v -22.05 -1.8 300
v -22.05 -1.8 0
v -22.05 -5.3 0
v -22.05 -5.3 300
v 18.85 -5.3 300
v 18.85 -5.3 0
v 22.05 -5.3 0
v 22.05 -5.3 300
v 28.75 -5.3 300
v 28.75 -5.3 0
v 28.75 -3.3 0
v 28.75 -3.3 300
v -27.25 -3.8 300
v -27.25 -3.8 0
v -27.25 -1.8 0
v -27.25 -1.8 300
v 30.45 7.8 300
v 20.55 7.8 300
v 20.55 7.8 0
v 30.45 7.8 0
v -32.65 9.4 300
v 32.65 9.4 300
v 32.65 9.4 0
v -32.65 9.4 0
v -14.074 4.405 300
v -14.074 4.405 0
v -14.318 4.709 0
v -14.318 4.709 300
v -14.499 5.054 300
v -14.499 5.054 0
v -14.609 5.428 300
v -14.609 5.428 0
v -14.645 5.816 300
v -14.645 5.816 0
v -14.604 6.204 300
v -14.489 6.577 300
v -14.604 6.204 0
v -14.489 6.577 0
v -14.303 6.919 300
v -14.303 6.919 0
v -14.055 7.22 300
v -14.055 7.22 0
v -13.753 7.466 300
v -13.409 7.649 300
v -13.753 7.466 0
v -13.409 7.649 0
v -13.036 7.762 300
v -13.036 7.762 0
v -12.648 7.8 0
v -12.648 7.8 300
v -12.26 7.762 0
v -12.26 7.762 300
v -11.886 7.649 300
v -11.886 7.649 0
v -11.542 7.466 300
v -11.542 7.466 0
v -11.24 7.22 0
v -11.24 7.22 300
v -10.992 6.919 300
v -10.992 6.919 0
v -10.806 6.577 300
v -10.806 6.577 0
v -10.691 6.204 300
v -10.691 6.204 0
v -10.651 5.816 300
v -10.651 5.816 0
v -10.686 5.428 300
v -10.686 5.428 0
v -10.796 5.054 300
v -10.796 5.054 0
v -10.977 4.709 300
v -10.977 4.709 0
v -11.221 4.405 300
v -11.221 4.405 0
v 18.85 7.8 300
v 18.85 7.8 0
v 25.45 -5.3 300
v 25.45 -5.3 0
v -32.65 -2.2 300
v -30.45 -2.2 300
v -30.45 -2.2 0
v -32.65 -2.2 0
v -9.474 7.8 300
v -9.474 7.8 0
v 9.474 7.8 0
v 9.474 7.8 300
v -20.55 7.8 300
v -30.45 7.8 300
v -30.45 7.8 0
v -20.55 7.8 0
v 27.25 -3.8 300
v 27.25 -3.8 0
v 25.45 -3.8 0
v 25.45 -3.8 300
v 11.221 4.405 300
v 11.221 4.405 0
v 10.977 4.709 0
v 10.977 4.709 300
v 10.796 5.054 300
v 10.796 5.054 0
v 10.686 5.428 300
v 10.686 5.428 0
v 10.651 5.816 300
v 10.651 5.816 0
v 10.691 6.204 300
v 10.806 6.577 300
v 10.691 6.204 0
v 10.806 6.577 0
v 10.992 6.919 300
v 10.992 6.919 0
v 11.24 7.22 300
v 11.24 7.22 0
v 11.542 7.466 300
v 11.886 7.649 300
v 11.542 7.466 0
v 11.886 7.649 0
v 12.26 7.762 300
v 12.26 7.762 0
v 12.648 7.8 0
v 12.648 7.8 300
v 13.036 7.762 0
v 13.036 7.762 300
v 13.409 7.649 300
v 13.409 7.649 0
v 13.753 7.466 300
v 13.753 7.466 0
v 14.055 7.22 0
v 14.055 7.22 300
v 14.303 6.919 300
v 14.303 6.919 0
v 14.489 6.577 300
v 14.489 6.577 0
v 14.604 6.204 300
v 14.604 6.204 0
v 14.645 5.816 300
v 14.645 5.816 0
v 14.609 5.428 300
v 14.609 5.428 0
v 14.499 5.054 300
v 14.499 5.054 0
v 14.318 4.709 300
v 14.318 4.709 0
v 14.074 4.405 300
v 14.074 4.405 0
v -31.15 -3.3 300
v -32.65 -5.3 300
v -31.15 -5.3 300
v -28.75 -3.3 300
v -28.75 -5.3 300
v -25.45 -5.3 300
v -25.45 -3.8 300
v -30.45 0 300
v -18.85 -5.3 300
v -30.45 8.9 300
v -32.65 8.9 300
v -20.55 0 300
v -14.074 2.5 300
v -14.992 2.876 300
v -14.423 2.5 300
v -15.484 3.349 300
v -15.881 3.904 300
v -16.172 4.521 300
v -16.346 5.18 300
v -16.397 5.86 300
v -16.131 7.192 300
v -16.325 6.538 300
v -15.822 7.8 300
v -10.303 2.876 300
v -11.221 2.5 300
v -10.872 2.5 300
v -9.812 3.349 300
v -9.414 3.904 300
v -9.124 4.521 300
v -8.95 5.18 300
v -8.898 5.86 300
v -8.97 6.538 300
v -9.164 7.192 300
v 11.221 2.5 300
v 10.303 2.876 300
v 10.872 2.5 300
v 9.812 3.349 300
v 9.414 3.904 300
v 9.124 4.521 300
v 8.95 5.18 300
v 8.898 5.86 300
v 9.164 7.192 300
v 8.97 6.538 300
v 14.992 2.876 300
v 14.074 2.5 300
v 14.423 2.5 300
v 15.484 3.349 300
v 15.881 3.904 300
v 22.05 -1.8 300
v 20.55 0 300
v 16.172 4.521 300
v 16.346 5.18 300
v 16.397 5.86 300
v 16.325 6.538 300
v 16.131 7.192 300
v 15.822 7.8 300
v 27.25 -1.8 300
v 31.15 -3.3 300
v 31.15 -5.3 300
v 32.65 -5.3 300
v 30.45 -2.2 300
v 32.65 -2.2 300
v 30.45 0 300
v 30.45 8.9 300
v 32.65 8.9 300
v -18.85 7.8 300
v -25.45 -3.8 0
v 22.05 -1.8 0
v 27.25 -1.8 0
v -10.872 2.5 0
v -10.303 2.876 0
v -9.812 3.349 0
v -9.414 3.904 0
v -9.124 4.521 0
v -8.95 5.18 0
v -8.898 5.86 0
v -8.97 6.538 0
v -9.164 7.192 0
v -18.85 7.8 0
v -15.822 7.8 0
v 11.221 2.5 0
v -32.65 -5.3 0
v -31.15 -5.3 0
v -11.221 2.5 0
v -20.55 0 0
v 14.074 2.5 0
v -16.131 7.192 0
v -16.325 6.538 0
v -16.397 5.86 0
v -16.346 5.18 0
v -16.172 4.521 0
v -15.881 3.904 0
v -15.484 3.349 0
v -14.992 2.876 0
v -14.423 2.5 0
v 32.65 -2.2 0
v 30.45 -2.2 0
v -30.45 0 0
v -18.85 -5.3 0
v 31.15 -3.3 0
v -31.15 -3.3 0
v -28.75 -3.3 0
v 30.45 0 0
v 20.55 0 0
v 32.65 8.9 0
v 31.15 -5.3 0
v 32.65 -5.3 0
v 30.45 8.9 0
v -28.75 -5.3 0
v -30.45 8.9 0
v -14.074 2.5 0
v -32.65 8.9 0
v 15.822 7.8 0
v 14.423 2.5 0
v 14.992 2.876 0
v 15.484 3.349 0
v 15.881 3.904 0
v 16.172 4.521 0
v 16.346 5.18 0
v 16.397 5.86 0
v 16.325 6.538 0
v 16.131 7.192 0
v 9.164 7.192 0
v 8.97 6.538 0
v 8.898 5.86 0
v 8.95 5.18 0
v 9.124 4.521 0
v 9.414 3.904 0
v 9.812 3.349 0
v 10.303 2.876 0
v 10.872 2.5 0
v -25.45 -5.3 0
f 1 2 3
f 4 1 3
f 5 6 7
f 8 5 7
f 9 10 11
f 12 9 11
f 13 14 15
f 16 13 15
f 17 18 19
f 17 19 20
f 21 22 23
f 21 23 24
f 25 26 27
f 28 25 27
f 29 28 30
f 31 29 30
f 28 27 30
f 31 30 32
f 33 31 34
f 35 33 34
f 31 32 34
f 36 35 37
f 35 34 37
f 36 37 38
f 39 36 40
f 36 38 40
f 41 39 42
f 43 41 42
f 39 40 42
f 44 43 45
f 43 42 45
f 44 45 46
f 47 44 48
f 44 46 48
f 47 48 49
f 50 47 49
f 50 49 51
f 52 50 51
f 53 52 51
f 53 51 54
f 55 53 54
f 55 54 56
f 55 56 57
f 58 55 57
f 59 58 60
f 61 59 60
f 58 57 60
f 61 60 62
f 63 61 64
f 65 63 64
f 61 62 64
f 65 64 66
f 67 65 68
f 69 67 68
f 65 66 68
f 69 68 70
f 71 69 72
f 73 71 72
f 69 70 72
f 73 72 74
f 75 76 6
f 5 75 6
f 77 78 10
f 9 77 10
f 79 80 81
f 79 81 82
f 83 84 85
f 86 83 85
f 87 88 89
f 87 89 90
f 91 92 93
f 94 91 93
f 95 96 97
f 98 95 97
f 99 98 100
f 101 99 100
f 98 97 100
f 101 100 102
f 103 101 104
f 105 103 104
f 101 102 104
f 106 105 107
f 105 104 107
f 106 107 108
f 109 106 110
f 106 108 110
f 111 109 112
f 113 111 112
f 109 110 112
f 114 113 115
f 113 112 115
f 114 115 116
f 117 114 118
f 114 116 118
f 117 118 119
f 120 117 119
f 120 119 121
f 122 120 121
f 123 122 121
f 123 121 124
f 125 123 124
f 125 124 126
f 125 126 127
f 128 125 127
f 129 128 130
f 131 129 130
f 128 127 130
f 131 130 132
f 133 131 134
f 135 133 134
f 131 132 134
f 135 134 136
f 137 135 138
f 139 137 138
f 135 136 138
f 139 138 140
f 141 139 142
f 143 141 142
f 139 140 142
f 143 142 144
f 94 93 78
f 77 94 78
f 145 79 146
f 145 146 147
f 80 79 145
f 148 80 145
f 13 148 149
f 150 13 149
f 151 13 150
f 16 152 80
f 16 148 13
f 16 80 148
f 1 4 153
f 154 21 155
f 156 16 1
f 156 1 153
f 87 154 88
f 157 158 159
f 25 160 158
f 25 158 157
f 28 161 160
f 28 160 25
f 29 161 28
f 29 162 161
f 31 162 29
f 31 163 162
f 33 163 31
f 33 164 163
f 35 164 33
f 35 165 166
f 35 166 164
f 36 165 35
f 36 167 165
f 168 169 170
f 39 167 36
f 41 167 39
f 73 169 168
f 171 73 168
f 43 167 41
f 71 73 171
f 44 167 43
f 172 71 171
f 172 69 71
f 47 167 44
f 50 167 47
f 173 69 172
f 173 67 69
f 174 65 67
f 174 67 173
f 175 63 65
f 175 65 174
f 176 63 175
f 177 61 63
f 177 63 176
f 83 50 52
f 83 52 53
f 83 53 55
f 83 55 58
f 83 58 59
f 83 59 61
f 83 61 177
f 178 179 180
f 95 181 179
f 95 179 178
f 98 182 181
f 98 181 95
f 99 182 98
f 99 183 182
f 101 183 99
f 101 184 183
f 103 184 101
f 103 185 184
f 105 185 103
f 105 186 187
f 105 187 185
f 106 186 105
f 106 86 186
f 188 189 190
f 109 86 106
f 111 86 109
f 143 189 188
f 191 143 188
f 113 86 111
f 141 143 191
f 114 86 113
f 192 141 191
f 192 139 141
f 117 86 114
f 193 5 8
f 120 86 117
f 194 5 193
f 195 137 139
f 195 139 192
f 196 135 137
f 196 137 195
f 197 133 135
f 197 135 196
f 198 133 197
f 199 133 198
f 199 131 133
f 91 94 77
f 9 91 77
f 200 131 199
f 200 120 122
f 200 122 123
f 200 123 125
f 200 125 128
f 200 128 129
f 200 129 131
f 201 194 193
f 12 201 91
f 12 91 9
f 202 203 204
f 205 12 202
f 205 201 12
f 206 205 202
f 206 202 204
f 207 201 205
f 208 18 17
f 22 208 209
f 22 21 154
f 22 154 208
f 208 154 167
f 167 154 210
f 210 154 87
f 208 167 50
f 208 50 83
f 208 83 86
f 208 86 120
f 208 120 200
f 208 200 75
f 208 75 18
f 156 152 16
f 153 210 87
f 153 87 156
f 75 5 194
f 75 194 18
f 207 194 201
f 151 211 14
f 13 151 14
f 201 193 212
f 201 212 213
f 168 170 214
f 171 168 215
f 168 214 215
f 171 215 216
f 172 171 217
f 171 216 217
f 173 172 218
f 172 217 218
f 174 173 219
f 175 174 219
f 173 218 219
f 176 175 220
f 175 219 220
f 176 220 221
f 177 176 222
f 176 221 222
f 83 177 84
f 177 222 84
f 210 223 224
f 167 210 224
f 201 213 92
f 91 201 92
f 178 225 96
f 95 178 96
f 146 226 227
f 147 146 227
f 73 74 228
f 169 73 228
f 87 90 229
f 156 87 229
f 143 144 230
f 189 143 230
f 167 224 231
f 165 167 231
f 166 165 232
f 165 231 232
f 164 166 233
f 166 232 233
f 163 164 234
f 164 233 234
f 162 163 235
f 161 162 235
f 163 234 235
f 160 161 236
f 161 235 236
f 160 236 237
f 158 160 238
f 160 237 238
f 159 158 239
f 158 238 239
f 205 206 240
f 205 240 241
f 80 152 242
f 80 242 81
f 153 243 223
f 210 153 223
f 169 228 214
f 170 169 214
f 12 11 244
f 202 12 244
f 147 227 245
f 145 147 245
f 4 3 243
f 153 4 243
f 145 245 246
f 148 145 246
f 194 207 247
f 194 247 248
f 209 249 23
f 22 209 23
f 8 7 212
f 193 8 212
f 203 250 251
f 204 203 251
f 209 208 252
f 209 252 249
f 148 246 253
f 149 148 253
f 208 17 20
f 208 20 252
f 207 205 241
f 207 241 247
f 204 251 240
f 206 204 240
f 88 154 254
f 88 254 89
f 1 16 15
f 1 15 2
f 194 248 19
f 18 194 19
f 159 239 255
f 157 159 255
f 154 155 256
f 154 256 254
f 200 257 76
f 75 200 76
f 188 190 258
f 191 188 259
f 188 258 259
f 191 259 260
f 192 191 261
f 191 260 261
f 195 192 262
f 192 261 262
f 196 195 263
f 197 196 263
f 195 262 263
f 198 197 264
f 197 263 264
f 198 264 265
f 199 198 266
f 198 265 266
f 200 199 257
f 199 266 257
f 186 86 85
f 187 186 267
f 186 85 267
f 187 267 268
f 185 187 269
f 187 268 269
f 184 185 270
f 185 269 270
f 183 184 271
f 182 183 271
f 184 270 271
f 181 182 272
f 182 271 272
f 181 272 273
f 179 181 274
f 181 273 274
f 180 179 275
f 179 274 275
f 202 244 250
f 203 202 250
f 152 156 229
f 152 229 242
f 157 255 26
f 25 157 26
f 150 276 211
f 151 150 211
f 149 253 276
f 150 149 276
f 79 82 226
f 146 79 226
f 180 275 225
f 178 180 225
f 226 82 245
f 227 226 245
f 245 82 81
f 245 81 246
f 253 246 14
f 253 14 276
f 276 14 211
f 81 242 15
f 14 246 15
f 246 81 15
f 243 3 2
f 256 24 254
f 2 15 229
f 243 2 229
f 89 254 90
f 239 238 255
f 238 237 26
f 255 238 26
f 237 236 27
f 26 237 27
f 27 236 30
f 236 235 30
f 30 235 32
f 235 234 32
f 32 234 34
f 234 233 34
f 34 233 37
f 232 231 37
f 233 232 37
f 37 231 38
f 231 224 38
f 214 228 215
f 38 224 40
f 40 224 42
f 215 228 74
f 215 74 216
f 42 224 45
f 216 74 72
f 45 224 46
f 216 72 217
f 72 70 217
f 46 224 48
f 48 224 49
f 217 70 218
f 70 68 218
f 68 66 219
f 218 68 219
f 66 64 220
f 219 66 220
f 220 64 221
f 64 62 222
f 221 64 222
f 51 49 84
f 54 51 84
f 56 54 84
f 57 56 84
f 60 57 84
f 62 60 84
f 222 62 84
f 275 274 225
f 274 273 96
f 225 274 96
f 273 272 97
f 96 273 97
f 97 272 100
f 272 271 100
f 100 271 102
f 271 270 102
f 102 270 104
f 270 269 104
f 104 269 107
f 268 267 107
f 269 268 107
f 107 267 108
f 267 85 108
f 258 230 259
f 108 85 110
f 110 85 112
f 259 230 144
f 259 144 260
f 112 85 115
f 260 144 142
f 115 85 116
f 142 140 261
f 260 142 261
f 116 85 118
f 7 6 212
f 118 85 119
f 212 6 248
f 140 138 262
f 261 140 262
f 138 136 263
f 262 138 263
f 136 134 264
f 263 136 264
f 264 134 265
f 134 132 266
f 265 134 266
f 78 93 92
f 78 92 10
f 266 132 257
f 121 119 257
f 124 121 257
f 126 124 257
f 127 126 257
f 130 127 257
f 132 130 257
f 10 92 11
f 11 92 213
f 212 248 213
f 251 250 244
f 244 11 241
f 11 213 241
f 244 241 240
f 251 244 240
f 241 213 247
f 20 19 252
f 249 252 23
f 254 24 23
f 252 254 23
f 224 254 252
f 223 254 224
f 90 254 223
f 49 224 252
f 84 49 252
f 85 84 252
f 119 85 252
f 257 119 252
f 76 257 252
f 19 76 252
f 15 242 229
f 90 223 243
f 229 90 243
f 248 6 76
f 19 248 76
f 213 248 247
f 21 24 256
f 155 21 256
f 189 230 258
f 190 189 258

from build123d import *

# Parameters (mm, degrees)
ESTRUSIONE_ESTRUSIONE1_DEPTH = 300
SCHIZZO2_W                   = 3.5
SCHIZZO2_H                   = 4.6
TAGLIO_ESTRUSIONE1_DEPTH     = 303.096048468


with BuildPart() as part:
    # Schizzo1 → Estrusione-Estrusione1 (new body)
    with BuildSketch(Plane.XY):
        with BuildLine():
            Line((-30.15, 14), (-32.65, 14))
            Line((-32.65, 14), (-32.65, 8.9))
            Line((-32.65, 8.9), (-30.45, 8.9))
            Line((-30.45, 8.9), (-30.45, 7.8))
            Line((-30.45, 7.8), (-20.55, 7.8))
            Line((-20.55, 7.8), (-20.55, 0))
            Line((-20.55, 0), (-30.45, 0))
            Line((-30.45, 0), (-30.45, -2.2))
            Line((-30.45, -2.2), (-32.65, -2.2))
            Line((-32.65, -2.2), (-32.65, -5.3))
            Line((-32.65, -5.3), (-31.15, -5.3))
            Line((-31.15, -5.3), (-31.15, -3.3))
            Line((-31.15, -3.3), (-28.75, -3.3))
            Line((-28.75, -3.3), (-28.75, -5.3))
            Line((-28.75, -5.3), (-25.45, -5.3))
            Line((-25.45, -5.3), (-25.45, -3.8))
            Line((-25.45, -3.8), (-27.25, -3.8))
            Line((-27.25, -3.8), (-27.25, -1.8))
            Line((-27.25, -1.8), (-22.05, -1.8))
            Line((-22.05, -1.8), (-22.05, -5.3))
            Line((-22.05, -5.3), (-18.85, -5.3))
            Line((-18.85, -5.3), (-18.85, 7.8))
            Line((-18.85, 7.8), (-15.821542758, 7.8))
            ThreePointArc((-15.821542758, 7.8), (-16.273540604, 4.846345824), (-14.423395659, 2.5))
            Line((-14.423395659, 2.5), (-14.074102014, 2.5))
            Line((-14.074102014, 2.5), (-14.074102014, 4.405182935))
            ThreePointArc((-14.074102014, 4.405182935), (-12.647585955, 7.8), (-11.221069895, 4.405182935))
            Line((-11.221069895, 4.405182935), (-11.221069895, 2.5))
            Line((-11.221069895, 2.5), (-10.87177625, 2.5))
            ThreePointArc((-10.87177625, 2.5), (-9.021631305, 4.846345824), (-9.473629151, 7.8))
            Line((-9.473629151, 7.8), (0, 7.8))
            Line((0, 7.8), (0, 9.4))
            Line((0, 9.4), (-29.15, 9.4))
            Line((-29.15, 9.4), (-29.15, 10.5))
            Line((-29.15, 10.5), (-30.15, 10.5))
            Line((-30.15, 10.5), (-30.15, 14))
        make_face()
        with BuildLine():
            Line((29.15, 9.4), (0, 9.4))
            Line((0, 9.4), (0, 7.8))
            Line((0, 7.8), (9.473629151, 7.8))
            ThreePointArc((9.473629151, 7.8), (9.021631305, 4.846345824), (10.87177625, 2.5))
            Line((10.87177625, 2.5), (11.221069895, 2.5))
            Line((11.221069895, 2.5), (11.221069895, 4.405182935))
            ThreePointArc((11.221069895, 4.405182935), (12.647585955, 7.8), (14.074102014, 4.405182935))
            Line((14.074102014, 4.405182935), (14.074102014, 2.5))
            Line((14.074102014, 2.5), (14.423395659, 2.5))
            ThreePointArc((14.423395659, 2.5), (16.273540604, 4.846345824), (15.821542758, 7.8))
            Line((15.821542758, 7.8), (18.85, 7.8))
            Line((18.85, 7.8), (18.85, -5.3))
            Line((18.85, -5.3), (22.05, -5.3))
            Line((22.05, -5.3), (22.05, -1.8))
            Line((22.05, -1.8), (27.25, -1.8))
            Line((27.25, -1.8), (27.25, -3.8))
            Line((27.25, -3.8), (25.45, -3.8))
            Line((25.45, -3.8), (25.45, -5.3))
            Line((25.45, -5.3), (28.75, -5.3))
            Line((28.75, -5.3), (28.75, -3.3))
            Line((28.75, -3.3), (31.15, -3.3))
            Line((31.15, -3.3), (31.15, -5.3))
            Line((31.15, -5.3), (32.65, -5.3))
            Line((32.65, -5.3), (32.65, -2.2))
            Line((32.65, -2.2), (30.45, -2.2))
            Line((30.45, -2.2), (30.45, 0))
            Line((30.45, 0), (20.55, 0))
            Line((20.55, 0), (20.55, 7.8))
            Line((20.55, 7.8), (30.45, 7.8))
            Line((30.45, 7.8), (30.45, 8.9))
            Line((30.45, 8.9), (32.65, 8.9))
            Line((32.65, 8.9), (32.65, 14))
            Line((32.65, 14), (30.15, 14))
            Line((30.15, 14), (30.15, 10.5))
            Line((30.15, 10.5), (29.15, 10.5))
            Line((29.15, 10.5), (29.15, 9.4))
        make_face()
    extrude(amount=ESTRUSIONE_ESTRUSIONE1_DEPTH)

    # Schizzo2 → Taglio-Estrusione1 (cut, through all)
    with BuildSketch(Plane.XY.offset(300)):
        with Locations((30.9, 11.7)):
            Rectangle(SCHIZZO2_W, SCHIZZO2_H)
    taglio_estrusione1 = extrude(amount=-TAGLIO_ESTRUSIONE1_DEPTH, mode=Mode.SUBTRACT)

    # Specchia1: Taglio-Estrusione1 across plane
    add(taglio_estrusione1.mirror(Plane(origin=(0, 0, 0), x_dir=(0, 0, 1), z_dir=(1, 0, 0))), mode=Mode.SUBTRACT)


solid = part.part
